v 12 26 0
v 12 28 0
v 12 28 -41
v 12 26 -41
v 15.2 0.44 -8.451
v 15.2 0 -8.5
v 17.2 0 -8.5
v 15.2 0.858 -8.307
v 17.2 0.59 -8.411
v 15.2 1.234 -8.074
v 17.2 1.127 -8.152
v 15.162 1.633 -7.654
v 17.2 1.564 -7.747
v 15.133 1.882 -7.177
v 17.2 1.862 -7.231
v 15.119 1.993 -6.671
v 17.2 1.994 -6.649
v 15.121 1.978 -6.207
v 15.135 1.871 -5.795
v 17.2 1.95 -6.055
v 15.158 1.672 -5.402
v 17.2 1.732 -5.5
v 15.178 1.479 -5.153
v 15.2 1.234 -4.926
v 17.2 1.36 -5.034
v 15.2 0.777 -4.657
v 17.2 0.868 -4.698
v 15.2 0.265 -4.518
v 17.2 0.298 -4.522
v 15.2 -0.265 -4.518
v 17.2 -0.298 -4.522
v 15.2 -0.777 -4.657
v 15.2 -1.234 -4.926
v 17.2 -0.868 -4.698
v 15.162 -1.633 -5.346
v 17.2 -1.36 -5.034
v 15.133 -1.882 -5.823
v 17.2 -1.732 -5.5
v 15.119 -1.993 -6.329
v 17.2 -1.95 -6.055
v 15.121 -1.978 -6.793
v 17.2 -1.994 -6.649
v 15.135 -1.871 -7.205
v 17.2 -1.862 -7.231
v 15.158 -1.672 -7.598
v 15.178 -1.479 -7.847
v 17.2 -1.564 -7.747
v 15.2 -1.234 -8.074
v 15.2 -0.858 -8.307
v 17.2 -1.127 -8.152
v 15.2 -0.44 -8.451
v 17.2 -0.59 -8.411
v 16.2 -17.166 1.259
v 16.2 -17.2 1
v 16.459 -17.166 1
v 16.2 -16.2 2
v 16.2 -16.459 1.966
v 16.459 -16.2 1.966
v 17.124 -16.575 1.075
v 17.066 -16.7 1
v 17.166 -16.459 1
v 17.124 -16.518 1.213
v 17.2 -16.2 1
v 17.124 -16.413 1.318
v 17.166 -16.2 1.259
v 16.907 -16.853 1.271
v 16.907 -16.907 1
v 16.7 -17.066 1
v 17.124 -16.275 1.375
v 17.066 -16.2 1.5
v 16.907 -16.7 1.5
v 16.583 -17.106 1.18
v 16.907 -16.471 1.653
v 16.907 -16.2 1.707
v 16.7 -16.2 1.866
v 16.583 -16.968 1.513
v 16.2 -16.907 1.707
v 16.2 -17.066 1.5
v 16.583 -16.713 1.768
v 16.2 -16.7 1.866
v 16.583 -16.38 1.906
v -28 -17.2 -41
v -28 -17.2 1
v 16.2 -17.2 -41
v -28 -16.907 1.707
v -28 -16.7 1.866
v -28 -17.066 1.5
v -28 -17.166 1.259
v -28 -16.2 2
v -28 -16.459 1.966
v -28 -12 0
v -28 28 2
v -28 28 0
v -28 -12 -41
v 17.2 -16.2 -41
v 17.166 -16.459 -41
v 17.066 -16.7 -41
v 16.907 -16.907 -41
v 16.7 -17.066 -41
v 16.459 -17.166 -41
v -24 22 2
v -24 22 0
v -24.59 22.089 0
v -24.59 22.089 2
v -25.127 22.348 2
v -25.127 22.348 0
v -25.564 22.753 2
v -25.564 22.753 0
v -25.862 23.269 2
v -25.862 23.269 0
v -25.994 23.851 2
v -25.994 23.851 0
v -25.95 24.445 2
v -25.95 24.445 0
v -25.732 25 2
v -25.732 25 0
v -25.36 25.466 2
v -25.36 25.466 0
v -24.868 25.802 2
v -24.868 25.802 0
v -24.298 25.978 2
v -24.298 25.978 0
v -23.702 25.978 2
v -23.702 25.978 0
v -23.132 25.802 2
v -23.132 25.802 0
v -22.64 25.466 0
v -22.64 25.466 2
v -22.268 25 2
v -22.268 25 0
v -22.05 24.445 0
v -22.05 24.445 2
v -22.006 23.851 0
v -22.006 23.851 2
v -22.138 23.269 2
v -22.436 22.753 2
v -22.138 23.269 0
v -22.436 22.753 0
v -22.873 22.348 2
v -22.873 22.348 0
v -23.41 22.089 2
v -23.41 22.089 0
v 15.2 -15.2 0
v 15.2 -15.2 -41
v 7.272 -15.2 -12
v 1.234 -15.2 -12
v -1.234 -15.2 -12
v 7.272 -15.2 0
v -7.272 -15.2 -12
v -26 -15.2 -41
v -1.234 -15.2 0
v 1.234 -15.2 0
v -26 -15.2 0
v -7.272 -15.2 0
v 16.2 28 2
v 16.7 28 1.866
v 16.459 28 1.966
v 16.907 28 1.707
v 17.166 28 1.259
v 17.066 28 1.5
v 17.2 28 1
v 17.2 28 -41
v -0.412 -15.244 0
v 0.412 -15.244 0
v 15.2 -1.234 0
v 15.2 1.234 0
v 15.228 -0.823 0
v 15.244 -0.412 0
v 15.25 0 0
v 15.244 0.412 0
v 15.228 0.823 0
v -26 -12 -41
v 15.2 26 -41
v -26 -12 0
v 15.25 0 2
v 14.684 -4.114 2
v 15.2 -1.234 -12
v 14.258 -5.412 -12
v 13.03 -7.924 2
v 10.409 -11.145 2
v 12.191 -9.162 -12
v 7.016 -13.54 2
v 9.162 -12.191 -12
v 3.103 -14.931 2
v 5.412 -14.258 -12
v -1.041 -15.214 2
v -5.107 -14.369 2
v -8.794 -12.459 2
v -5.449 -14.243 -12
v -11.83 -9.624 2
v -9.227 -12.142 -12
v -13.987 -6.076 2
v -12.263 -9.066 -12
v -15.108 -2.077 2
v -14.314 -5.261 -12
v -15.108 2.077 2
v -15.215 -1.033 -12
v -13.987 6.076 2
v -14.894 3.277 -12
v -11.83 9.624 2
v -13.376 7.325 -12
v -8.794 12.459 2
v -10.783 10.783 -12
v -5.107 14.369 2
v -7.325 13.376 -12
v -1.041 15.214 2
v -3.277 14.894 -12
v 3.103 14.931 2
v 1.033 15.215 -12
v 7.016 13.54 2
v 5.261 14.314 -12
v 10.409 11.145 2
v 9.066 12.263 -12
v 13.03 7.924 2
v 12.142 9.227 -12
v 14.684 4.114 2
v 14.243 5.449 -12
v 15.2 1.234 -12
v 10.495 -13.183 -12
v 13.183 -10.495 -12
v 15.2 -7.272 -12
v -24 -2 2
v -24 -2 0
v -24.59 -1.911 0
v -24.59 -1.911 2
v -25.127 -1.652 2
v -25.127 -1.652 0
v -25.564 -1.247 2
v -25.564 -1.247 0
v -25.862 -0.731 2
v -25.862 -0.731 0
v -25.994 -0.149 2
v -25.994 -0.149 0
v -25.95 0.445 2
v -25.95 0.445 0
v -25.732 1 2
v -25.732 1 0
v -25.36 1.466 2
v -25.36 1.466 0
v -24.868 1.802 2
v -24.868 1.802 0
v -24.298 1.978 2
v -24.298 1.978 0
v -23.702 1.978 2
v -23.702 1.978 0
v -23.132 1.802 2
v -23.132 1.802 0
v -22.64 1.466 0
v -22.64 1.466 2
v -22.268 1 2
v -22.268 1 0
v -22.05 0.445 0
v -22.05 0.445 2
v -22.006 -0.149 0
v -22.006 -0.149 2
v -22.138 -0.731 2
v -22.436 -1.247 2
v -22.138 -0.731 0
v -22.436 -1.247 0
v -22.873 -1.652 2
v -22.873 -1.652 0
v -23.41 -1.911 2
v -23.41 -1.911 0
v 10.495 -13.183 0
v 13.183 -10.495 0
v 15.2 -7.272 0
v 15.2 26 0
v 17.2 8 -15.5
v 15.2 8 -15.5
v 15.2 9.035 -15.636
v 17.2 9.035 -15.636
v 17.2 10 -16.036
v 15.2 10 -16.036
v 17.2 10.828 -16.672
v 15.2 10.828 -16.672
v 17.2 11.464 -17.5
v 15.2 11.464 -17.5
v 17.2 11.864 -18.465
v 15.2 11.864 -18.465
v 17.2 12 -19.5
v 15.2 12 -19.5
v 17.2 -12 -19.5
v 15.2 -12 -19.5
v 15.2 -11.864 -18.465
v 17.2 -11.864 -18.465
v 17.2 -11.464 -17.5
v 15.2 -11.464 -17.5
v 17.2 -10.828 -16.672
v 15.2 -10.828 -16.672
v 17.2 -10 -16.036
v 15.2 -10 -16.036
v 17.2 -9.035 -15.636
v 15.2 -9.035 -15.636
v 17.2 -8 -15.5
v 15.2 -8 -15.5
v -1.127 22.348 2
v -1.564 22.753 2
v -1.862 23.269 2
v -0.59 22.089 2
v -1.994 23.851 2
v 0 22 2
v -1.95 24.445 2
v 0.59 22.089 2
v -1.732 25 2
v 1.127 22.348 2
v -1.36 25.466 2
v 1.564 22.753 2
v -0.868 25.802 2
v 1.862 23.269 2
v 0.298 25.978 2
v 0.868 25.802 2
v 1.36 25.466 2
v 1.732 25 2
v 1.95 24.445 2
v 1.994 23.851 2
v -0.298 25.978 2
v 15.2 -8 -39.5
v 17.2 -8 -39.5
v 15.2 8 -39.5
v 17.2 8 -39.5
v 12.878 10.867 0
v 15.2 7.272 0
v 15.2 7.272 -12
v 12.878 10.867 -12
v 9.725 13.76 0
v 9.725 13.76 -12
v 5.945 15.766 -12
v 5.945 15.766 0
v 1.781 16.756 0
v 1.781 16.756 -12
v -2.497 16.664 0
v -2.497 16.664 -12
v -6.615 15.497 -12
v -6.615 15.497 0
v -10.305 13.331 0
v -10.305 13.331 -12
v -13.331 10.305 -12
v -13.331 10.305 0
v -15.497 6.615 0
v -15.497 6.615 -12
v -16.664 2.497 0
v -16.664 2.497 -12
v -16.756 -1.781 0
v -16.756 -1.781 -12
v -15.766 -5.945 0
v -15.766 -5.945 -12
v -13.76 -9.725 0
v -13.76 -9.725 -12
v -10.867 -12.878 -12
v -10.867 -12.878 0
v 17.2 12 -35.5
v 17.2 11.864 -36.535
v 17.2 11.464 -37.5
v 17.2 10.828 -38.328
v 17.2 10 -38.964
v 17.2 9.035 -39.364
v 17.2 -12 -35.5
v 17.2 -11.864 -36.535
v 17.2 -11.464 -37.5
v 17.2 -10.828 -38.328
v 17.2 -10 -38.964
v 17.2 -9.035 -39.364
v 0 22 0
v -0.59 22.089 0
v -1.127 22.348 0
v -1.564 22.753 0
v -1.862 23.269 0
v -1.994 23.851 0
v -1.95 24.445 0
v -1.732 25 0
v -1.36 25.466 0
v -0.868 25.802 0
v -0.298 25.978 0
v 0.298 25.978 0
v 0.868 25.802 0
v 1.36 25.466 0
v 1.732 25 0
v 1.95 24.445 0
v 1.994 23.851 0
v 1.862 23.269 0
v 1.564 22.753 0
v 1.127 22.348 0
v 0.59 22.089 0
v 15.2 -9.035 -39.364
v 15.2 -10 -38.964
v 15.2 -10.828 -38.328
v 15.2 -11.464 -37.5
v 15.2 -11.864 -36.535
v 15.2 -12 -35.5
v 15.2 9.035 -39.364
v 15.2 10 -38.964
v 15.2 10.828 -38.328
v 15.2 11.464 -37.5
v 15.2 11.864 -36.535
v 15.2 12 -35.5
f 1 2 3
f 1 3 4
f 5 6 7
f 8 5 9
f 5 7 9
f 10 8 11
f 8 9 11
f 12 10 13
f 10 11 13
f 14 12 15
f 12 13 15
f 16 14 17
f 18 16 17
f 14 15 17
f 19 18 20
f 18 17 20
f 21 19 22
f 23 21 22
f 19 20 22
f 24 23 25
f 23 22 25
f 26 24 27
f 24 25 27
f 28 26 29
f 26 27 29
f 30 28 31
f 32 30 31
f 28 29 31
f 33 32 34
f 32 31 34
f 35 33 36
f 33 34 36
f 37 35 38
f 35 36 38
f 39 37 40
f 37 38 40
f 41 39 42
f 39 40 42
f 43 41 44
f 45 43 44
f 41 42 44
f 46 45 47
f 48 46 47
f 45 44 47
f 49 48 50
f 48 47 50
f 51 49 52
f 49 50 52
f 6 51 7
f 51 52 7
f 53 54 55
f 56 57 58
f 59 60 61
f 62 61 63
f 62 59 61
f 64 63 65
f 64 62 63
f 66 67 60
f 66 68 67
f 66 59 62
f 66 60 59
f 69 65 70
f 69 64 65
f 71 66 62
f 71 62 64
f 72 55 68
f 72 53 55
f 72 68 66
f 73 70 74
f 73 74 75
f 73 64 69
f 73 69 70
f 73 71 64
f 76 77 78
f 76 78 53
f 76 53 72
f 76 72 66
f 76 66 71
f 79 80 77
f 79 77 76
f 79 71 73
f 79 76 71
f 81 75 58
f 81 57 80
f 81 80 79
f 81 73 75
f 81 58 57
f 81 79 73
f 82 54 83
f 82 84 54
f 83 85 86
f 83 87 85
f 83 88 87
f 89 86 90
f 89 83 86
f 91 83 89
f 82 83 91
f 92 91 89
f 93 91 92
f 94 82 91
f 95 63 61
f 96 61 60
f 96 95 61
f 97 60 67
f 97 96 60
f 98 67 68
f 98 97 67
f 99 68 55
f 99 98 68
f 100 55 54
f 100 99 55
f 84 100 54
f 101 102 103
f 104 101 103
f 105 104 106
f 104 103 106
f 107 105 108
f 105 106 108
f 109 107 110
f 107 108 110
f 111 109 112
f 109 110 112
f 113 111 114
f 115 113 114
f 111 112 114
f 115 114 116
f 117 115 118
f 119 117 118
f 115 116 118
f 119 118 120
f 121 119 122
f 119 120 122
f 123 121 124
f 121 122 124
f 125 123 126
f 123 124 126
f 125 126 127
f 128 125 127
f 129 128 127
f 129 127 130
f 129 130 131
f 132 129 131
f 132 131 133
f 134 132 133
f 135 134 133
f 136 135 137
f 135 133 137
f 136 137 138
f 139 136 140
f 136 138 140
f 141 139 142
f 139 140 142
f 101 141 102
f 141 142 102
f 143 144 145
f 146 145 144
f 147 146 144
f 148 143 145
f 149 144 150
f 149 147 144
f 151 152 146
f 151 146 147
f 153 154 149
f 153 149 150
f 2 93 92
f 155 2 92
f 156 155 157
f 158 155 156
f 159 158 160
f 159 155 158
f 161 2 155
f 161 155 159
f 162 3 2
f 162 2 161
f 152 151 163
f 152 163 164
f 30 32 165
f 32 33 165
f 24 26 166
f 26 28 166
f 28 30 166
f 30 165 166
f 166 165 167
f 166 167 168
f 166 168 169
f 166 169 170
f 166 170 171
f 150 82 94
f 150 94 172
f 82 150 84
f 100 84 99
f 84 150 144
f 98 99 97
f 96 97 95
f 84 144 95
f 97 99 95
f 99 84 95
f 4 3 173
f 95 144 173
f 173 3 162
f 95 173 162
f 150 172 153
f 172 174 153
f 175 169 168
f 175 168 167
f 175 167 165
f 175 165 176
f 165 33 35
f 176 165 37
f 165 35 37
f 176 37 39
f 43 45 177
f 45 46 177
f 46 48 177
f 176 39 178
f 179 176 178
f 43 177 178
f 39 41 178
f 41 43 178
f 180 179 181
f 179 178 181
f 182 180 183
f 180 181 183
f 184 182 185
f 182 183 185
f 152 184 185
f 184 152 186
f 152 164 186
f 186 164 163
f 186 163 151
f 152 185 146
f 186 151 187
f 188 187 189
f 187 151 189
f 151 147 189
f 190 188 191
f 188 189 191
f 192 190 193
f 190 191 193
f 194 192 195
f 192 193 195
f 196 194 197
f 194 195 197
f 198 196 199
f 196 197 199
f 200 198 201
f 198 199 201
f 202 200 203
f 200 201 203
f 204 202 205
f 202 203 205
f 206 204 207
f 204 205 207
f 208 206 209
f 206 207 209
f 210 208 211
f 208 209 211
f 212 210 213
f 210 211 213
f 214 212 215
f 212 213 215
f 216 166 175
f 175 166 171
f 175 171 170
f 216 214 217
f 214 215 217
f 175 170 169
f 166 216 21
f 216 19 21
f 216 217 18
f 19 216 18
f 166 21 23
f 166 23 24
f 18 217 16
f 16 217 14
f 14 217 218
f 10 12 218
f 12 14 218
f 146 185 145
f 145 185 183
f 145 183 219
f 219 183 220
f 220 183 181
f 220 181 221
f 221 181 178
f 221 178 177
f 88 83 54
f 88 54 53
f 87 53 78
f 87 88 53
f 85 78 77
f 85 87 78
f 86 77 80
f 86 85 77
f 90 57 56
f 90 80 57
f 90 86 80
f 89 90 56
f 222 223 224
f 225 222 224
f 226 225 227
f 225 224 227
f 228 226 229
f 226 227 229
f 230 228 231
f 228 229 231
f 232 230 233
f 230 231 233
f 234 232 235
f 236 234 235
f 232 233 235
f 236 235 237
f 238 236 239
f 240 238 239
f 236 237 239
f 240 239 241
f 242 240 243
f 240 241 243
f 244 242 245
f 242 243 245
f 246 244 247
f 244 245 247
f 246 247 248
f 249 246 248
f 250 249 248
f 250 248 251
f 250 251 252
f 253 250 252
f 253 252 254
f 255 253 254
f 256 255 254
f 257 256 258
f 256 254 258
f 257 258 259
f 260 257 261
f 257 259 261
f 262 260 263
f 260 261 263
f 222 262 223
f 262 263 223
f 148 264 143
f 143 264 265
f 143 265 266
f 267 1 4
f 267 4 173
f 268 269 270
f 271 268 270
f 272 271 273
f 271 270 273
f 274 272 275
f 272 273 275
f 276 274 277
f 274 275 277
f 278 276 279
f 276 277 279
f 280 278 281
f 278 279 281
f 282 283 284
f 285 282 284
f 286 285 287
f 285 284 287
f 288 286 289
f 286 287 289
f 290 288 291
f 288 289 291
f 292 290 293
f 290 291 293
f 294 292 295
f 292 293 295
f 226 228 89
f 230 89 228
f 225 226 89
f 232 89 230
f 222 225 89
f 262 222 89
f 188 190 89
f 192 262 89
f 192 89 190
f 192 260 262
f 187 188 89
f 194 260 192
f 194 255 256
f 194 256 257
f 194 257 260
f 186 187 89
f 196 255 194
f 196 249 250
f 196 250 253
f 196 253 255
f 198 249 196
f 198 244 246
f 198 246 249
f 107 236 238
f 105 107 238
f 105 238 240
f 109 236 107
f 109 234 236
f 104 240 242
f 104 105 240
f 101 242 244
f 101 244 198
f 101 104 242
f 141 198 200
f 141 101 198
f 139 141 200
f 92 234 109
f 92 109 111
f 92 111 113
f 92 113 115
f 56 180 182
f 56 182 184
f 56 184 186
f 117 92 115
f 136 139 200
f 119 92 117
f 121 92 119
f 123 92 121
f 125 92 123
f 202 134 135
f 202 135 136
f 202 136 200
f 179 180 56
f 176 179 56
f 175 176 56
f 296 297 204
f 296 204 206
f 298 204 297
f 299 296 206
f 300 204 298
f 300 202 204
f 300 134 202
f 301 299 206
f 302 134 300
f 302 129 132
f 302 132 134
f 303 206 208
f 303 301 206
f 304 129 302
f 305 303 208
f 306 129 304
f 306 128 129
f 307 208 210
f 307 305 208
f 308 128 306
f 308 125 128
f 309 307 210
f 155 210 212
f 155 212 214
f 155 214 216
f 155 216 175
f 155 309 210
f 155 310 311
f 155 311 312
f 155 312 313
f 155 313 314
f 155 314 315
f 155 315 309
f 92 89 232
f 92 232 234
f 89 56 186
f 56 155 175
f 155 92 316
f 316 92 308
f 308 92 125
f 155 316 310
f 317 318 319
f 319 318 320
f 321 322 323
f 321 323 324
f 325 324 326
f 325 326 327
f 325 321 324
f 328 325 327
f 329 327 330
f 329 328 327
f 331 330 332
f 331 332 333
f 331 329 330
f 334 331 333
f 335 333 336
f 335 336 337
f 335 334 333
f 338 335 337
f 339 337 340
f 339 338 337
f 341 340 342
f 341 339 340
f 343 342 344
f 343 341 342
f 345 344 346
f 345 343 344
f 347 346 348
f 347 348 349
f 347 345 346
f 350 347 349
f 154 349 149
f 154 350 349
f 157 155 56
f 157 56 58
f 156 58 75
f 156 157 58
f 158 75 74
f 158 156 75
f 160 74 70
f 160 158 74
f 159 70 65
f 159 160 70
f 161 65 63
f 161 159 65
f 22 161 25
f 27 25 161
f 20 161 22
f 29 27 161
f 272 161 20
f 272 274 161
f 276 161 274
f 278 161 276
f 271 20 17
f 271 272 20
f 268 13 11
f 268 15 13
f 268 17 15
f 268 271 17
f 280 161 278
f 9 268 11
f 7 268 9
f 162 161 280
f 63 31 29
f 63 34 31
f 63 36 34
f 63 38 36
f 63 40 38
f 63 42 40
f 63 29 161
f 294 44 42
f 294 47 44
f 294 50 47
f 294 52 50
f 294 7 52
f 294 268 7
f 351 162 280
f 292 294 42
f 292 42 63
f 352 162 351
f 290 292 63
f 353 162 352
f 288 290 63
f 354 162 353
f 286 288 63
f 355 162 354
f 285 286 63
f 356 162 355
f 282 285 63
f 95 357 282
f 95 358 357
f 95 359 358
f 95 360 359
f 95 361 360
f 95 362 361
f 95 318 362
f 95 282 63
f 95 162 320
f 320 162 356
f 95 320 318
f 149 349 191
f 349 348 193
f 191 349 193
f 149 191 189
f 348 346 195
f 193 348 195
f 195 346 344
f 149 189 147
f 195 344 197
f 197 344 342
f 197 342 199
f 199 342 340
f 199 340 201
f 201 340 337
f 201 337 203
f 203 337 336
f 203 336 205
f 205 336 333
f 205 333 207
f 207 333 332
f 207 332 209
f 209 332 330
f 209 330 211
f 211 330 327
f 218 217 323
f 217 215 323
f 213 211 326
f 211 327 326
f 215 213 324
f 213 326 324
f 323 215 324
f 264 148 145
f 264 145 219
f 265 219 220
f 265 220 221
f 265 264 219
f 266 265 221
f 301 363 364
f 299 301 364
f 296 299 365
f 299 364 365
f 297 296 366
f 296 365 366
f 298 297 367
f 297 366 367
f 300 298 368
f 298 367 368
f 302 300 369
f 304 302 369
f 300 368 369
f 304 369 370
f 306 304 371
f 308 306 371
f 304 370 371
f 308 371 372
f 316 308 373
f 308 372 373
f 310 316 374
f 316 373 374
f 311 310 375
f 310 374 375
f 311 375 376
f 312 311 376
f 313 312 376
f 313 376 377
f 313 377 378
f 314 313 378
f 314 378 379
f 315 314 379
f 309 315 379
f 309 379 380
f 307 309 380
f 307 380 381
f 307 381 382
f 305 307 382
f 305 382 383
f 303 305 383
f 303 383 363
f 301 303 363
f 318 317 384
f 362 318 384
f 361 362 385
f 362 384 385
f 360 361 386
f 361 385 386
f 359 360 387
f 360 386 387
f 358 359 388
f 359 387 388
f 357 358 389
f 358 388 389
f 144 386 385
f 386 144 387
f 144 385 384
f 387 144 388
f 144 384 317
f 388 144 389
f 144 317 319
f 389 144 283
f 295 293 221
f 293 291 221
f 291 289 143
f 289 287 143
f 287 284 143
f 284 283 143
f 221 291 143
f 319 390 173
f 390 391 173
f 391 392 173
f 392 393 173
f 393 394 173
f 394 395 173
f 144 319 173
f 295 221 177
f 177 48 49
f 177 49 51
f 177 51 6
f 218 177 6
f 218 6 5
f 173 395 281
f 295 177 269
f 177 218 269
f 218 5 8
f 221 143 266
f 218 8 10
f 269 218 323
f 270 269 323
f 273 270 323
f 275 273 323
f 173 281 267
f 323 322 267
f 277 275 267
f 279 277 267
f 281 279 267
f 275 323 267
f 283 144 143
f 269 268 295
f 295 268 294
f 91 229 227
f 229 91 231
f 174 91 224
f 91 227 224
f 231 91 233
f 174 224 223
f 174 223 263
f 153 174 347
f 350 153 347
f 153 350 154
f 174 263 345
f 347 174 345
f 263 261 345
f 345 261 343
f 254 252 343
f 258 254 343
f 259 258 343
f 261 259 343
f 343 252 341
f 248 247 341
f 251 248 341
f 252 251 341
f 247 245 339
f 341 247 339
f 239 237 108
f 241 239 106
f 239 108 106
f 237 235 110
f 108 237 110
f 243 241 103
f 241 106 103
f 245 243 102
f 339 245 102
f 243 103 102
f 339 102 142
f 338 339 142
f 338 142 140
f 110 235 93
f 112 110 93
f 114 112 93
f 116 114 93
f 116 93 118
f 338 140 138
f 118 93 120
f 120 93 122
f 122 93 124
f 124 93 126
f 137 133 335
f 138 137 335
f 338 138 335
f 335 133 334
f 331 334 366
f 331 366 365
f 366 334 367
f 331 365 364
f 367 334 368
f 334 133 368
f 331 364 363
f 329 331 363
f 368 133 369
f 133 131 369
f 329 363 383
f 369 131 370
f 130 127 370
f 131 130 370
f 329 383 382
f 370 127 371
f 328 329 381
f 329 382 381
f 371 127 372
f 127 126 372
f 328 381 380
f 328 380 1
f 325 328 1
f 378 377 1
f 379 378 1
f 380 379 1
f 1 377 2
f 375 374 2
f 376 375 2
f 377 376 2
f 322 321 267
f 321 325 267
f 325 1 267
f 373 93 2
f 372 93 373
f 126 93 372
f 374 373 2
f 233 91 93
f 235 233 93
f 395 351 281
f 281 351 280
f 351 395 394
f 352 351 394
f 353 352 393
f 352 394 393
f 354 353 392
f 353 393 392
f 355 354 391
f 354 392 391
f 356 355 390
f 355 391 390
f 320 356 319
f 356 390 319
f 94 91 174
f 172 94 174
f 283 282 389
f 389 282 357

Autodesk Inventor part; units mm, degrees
ref_plane "YZ Plane" through (0, 0, 0) normal (1, 0, 0) x (0, 1, 0)
ref_plane "XZ Plane" through (0, 0, 0) normal (0, 1, 0) x (-1, 0, 0)
ref_plane "XY Plane" through (0, 0, 0) normal (0, 0, 1) x (1, 0, 0)
sketch "Sketch1" plane through (0, 0, 0) normal (0, 0, 1) x (1, 0, 0)
  circle A0 centre (0, 0) radius 15 construction
  line L0 (0, 0) -> (0, -12) construction
  line L1 (0, -12) -> (0, 28) construction
  line L2 (0, 28) -> (12, 28) construction
  line L3 (12, 28) -> (-28, 28) construction
  line L4 (-28, 28) -> (-28, -12) construction
  line L5 (-28, -12) -> (12, -12) construction
  line L6 (12, -12) -> (12, 28) construction
  line L7 (-28, 28) -> (17.2, 28)
  line L8 (17.2, 28) -> (17.2, -17.2)
  line L9 (17.2, -17.2) -> (-28, -17.2)
  line L10 (-28, -17.2) -> (-28, 28)
  circle A1 centre (0, 0) radius 15.25
  line L11 (0, -15.25) -> (0, -17.25) construction
  line L12 (-28, -17.2) -> (17.2, -17.2)
  line L13 (17.2, -17.2) -> (17.2, -15.3)
  line L14 (-28, -15.3) -> (-28, -17.2)
  line L15 (17.2, 28) -> (15.3, 28)
  line L16 (17.2, -15.3) -> (17.2, 28)
  circle A2 centre (0, 0) radius 16.85
  line L17 (15.25, 0) -> (17.25, 0) construction
  line L18 (-28, -17.2) -> (17.2, -17.2)
  line L19 (17.2, -17.2) -> (17.2, -15.2)
  line L20 (17.2, -15.2) -> (-28, -15.2)
  line L21 (-28, -15.2) -> (-28, -17.2)
  line L22 (17.2, -15.2) -> (15.2, -15.2)
  line L23 (15.2, -15.2) -> (15.2, 28)
  line L24 (15.2, 28) -> (17.2, 28)
  line L25 (17.2, 28) -> (17.2, -15.2)
  line L26 (-28, -12) -> (-26, -12)
  line L27 (-26, -12) -> (-26, -15.2)
  line L28 (-26, -15.2) -> (-28, -15.2)
  line L29 (-28, -15.2) -> (-28, -12)
  line L30 (15.2, 28) -> (12, 28)
  line L31 (12, 28) -> (12, 26)
  line L32 (12, 26) -> (15.2, 26)
  line L33 (15.2, 26) -> (15.2, 28)
  point P0 (15.2, -7.272)
  point P1 (15.2, 1.2339)
  point P2 (-1.2339, -15.2)
  point P3 (7.272, -15.2)
  point P4 (15.2, 7.272)
  point P5 (-7.272, -15.2)
  point P6 (15.2, -1.2339)
  point P7 (1.2339, -15.2)
  dimension "d0" = 30
  dimension "d1" = 12
  dimension "d2" = 40
  dimension "d3" = 12
  dimension "d4" = 40
  dimension "d5" = 40
  dimension "d6" = 45.2
  dimension "d7" = 45.2
  dimension "d8" = 30.5
  dimension "d22" = 2
  dimension "d30" = 1.6
  dimension "d33" = 2
  dimension "d34" = 2
  dimension "d35" = 2
  dimension "d43" = 2
  dimension "d44" = 2
extrude "Extrusion1" add sketch "Sketch1" along normal blind 2 contours L7 L31 L32 L23 A2 L20 L27 L26 L10 | L7 L23 L32 L31 | L26 L27 L20 L10 | L7 L8 L20 L23 A2 | L20 A2 L8 L9 L10 | L23 A1 L20 A2 | A2 L23 A1 | L20 A1 A2 | L20 A1 L23 A2 | A2 L23 L20
sketch "Sketch2" plane through (0, 0, 2) normal (0, 0, 1) x (1, 0, 0)
  line L0 (17.2, 28) -> (-28, 28) construction
  line L1 (-28, 28) -> (-28, 24) construction
  line L2 (-28, 28) -> (-28, -17.2) construction
  line L3 (-28, 24) -> (-24, 24) construction
  line L4 (-24, 24) -> (0, 24) construction
  line L5 (-24, 24) -> (-24, 0) construction
  point P0 (0, 0)
  dimension "d11" = 4
  dimension "d12" = 4
  dimension "d13" = 24
  dimension "d14" = 24
hole "Hole1" at (0, 24, 2) at (-24, 24, 2) at (-24, 0, 2) direction (0, 0, -1) diameter 4 end through all
extrude "Extrusion5" add sketch "Sketch1" against normal blind 41 contours L7 L8 L20 L23 A2 | L20 A2 L8 L9 L10 | A2 L23 A1 | L20 A1 A2 | A1 L23 | L20 A1
fillet "Fillet1" radius 1 3 edges at (-5.4, -17.2, 2) (17.2, 5.4, 2) (17.2, -17.2, -19.5)
extrude "Extrusion8" add sketch "Sketch1" against normal blind 41 contours L7 L23 L32 L31 | L26 L27 L20 L10
extrude "Extrusion12" add sketch "Sketch1" against normal blind 12 contours L23 A1 L20 A2 | L20 A1 L23 A2
sketch "Sketch5" plane through (17.2, -16.2, -41) normal (1, 0, 0) x (0, 0, -1)
  line L0 (0, 44.2) -> (0, 0) construction
  line L1 (0, 44.2) -> (0, 16.2) construction
  line L2 (0, 16.2) -> (-13.5, 16.2) construction
  line L3 (-41, 44.2) -> (-41, 42.2) construction
  line L4 (-41, 44.2) -> (-41, 16.2) construction
  line L5 (-41, 16.2) -> (-34.5, 16.2) construction
  circle A0 centre (-34.5, 16.2) radius 2
  line L6 (-25.5, 4.2) -> (-1.5, 4.2)
  line L7 (-1.5, 4.2) -> (-1.5, 28.2)
  line L8 (-1.5, 28.2) -> (-25.5, 28.2)
  line L9 (-25.5, 28.2) -> (-25.5, 4.2)
  line L10 (-25.5, 4.2) -> (-1.5, 28.2) construction
  line L11 (-1.5, 4.2) -> (-25.5, 28.2) construction
  dimension "d64" = 28
  dimension "d65" = 13.5
  dimension "d66" = 6.5
  dimension "d67" = 4
extrude "Extrusion14" cut sketch "Sketch5" against normal blind 3
fillet "Fillet2" radius 4 4 edges at (16.2, 12, -15.5) (16.2, -12, -15.5) (16.2, -12, -39.5) (16.2, 12, -39.5)
properties part number "MirrorFix" material "ABS Plastic"
